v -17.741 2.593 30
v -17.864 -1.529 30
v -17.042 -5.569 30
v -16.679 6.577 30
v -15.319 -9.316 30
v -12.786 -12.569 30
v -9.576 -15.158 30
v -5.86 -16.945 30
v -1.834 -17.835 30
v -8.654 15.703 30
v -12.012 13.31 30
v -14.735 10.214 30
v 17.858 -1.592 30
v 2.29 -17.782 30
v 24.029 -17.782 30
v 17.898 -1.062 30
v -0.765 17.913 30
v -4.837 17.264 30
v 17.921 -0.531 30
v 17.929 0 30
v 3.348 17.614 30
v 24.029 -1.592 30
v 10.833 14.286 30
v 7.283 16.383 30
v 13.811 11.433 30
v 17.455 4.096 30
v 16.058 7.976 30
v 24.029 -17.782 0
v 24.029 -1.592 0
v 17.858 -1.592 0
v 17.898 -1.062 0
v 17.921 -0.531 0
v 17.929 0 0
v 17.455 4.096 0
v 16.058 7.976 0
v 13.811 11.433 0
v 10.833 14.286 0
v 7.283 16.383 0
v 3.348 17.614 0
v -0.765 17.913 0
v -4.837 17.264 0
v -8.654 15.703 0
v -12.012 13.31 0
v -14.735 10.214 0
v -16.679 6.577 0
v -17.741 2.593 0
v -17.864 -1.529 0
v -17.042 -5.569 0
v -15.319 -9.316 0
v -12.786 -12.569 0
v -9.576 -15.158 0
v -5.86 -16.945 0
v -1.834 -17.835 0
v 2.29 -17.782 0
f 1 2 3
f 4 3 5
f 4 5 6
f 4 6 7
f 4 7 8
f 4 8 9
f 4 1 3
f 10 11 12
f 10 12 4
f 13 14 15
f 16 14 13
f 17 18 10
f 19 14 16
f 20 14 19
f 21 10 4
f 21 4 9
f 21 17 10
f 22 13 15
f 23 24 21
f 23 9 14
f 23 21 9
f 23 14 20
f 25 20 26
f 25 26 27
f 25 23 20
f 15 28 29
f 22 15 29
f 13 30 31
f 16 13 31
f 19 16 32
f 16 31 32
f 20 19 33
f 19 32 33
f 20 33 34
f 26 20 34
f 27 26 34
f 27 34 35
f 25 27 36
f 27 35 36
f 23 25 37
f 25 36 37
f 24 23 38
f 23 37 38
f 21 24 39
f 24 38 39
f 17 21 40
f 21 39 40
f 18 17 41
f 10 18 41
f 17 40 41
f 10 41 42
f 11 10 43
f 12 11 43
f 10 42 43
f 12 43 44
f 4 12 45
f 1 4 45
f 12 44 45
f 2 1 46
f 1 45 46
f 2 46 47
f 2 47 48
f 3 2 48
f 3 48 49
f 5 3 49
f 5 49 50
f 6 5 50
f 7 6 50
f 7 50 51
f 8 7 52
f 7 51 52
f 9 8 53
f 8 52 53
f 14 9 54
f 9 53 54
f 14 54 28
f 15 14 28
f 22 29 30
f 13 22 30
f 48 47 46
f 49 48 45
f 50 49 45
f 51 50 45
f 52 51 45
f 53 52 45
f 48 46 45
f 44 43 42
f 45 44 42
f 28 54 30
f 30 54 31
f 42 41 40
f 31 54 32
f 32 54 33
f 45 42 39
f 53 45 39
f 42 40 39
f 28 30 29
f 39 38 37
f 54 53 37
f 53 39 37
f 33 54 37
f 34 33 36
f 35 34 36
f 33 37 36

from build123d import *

# Parameters (mm, degrees)
F1_DEPTH = 30


with BuildPart() as f1:
    # F0 (on Top) → F1 (new body)
    with BuildSketch(Plane.XY):
        with BuildLine():
            Line((17.858347, -1.59188), (0, -1.59188))
            Line((0, -1.59188), (0, -17.782362))
            Line((0, -17.782362), (2.289595, -17.782362))
            ThreePointArc((2.289595, -17.782362), (12.923538, -12.427261), (17.858347, -1.59188))
        make_face()
        with BuildLine():
            Line((24.029288, -1.59188), (17.858347, -1.59188))
            ThreePointArc((17.858347, -1.59188), (12.923538, -12.427261), (2.289595, -17.782362))
            Line((2.289595, -17.782362), (24.029288, -17.782362))
            Line((24.029288, -17.782362), (24.029288, -1.59188))
        make_face()
        with BuildLine():
            Line((0, -17.782362), (0, -1.59188))
            Line((0, -1.59188), (17.858347, -1.59188))
            ThreePointArc((17.858347, -1.59188), (17.911445, -0.796727), (17.929156, 0))
            ThreePointArc((17.929156, 0), (-13.463008, 11.840696), (2.289595, -17.782362))
            Line((2.289595, -17.782362), (0, -17.782362))
        make_face()
    extrude(amount=F1_DEPTH)


solid = f1.part
